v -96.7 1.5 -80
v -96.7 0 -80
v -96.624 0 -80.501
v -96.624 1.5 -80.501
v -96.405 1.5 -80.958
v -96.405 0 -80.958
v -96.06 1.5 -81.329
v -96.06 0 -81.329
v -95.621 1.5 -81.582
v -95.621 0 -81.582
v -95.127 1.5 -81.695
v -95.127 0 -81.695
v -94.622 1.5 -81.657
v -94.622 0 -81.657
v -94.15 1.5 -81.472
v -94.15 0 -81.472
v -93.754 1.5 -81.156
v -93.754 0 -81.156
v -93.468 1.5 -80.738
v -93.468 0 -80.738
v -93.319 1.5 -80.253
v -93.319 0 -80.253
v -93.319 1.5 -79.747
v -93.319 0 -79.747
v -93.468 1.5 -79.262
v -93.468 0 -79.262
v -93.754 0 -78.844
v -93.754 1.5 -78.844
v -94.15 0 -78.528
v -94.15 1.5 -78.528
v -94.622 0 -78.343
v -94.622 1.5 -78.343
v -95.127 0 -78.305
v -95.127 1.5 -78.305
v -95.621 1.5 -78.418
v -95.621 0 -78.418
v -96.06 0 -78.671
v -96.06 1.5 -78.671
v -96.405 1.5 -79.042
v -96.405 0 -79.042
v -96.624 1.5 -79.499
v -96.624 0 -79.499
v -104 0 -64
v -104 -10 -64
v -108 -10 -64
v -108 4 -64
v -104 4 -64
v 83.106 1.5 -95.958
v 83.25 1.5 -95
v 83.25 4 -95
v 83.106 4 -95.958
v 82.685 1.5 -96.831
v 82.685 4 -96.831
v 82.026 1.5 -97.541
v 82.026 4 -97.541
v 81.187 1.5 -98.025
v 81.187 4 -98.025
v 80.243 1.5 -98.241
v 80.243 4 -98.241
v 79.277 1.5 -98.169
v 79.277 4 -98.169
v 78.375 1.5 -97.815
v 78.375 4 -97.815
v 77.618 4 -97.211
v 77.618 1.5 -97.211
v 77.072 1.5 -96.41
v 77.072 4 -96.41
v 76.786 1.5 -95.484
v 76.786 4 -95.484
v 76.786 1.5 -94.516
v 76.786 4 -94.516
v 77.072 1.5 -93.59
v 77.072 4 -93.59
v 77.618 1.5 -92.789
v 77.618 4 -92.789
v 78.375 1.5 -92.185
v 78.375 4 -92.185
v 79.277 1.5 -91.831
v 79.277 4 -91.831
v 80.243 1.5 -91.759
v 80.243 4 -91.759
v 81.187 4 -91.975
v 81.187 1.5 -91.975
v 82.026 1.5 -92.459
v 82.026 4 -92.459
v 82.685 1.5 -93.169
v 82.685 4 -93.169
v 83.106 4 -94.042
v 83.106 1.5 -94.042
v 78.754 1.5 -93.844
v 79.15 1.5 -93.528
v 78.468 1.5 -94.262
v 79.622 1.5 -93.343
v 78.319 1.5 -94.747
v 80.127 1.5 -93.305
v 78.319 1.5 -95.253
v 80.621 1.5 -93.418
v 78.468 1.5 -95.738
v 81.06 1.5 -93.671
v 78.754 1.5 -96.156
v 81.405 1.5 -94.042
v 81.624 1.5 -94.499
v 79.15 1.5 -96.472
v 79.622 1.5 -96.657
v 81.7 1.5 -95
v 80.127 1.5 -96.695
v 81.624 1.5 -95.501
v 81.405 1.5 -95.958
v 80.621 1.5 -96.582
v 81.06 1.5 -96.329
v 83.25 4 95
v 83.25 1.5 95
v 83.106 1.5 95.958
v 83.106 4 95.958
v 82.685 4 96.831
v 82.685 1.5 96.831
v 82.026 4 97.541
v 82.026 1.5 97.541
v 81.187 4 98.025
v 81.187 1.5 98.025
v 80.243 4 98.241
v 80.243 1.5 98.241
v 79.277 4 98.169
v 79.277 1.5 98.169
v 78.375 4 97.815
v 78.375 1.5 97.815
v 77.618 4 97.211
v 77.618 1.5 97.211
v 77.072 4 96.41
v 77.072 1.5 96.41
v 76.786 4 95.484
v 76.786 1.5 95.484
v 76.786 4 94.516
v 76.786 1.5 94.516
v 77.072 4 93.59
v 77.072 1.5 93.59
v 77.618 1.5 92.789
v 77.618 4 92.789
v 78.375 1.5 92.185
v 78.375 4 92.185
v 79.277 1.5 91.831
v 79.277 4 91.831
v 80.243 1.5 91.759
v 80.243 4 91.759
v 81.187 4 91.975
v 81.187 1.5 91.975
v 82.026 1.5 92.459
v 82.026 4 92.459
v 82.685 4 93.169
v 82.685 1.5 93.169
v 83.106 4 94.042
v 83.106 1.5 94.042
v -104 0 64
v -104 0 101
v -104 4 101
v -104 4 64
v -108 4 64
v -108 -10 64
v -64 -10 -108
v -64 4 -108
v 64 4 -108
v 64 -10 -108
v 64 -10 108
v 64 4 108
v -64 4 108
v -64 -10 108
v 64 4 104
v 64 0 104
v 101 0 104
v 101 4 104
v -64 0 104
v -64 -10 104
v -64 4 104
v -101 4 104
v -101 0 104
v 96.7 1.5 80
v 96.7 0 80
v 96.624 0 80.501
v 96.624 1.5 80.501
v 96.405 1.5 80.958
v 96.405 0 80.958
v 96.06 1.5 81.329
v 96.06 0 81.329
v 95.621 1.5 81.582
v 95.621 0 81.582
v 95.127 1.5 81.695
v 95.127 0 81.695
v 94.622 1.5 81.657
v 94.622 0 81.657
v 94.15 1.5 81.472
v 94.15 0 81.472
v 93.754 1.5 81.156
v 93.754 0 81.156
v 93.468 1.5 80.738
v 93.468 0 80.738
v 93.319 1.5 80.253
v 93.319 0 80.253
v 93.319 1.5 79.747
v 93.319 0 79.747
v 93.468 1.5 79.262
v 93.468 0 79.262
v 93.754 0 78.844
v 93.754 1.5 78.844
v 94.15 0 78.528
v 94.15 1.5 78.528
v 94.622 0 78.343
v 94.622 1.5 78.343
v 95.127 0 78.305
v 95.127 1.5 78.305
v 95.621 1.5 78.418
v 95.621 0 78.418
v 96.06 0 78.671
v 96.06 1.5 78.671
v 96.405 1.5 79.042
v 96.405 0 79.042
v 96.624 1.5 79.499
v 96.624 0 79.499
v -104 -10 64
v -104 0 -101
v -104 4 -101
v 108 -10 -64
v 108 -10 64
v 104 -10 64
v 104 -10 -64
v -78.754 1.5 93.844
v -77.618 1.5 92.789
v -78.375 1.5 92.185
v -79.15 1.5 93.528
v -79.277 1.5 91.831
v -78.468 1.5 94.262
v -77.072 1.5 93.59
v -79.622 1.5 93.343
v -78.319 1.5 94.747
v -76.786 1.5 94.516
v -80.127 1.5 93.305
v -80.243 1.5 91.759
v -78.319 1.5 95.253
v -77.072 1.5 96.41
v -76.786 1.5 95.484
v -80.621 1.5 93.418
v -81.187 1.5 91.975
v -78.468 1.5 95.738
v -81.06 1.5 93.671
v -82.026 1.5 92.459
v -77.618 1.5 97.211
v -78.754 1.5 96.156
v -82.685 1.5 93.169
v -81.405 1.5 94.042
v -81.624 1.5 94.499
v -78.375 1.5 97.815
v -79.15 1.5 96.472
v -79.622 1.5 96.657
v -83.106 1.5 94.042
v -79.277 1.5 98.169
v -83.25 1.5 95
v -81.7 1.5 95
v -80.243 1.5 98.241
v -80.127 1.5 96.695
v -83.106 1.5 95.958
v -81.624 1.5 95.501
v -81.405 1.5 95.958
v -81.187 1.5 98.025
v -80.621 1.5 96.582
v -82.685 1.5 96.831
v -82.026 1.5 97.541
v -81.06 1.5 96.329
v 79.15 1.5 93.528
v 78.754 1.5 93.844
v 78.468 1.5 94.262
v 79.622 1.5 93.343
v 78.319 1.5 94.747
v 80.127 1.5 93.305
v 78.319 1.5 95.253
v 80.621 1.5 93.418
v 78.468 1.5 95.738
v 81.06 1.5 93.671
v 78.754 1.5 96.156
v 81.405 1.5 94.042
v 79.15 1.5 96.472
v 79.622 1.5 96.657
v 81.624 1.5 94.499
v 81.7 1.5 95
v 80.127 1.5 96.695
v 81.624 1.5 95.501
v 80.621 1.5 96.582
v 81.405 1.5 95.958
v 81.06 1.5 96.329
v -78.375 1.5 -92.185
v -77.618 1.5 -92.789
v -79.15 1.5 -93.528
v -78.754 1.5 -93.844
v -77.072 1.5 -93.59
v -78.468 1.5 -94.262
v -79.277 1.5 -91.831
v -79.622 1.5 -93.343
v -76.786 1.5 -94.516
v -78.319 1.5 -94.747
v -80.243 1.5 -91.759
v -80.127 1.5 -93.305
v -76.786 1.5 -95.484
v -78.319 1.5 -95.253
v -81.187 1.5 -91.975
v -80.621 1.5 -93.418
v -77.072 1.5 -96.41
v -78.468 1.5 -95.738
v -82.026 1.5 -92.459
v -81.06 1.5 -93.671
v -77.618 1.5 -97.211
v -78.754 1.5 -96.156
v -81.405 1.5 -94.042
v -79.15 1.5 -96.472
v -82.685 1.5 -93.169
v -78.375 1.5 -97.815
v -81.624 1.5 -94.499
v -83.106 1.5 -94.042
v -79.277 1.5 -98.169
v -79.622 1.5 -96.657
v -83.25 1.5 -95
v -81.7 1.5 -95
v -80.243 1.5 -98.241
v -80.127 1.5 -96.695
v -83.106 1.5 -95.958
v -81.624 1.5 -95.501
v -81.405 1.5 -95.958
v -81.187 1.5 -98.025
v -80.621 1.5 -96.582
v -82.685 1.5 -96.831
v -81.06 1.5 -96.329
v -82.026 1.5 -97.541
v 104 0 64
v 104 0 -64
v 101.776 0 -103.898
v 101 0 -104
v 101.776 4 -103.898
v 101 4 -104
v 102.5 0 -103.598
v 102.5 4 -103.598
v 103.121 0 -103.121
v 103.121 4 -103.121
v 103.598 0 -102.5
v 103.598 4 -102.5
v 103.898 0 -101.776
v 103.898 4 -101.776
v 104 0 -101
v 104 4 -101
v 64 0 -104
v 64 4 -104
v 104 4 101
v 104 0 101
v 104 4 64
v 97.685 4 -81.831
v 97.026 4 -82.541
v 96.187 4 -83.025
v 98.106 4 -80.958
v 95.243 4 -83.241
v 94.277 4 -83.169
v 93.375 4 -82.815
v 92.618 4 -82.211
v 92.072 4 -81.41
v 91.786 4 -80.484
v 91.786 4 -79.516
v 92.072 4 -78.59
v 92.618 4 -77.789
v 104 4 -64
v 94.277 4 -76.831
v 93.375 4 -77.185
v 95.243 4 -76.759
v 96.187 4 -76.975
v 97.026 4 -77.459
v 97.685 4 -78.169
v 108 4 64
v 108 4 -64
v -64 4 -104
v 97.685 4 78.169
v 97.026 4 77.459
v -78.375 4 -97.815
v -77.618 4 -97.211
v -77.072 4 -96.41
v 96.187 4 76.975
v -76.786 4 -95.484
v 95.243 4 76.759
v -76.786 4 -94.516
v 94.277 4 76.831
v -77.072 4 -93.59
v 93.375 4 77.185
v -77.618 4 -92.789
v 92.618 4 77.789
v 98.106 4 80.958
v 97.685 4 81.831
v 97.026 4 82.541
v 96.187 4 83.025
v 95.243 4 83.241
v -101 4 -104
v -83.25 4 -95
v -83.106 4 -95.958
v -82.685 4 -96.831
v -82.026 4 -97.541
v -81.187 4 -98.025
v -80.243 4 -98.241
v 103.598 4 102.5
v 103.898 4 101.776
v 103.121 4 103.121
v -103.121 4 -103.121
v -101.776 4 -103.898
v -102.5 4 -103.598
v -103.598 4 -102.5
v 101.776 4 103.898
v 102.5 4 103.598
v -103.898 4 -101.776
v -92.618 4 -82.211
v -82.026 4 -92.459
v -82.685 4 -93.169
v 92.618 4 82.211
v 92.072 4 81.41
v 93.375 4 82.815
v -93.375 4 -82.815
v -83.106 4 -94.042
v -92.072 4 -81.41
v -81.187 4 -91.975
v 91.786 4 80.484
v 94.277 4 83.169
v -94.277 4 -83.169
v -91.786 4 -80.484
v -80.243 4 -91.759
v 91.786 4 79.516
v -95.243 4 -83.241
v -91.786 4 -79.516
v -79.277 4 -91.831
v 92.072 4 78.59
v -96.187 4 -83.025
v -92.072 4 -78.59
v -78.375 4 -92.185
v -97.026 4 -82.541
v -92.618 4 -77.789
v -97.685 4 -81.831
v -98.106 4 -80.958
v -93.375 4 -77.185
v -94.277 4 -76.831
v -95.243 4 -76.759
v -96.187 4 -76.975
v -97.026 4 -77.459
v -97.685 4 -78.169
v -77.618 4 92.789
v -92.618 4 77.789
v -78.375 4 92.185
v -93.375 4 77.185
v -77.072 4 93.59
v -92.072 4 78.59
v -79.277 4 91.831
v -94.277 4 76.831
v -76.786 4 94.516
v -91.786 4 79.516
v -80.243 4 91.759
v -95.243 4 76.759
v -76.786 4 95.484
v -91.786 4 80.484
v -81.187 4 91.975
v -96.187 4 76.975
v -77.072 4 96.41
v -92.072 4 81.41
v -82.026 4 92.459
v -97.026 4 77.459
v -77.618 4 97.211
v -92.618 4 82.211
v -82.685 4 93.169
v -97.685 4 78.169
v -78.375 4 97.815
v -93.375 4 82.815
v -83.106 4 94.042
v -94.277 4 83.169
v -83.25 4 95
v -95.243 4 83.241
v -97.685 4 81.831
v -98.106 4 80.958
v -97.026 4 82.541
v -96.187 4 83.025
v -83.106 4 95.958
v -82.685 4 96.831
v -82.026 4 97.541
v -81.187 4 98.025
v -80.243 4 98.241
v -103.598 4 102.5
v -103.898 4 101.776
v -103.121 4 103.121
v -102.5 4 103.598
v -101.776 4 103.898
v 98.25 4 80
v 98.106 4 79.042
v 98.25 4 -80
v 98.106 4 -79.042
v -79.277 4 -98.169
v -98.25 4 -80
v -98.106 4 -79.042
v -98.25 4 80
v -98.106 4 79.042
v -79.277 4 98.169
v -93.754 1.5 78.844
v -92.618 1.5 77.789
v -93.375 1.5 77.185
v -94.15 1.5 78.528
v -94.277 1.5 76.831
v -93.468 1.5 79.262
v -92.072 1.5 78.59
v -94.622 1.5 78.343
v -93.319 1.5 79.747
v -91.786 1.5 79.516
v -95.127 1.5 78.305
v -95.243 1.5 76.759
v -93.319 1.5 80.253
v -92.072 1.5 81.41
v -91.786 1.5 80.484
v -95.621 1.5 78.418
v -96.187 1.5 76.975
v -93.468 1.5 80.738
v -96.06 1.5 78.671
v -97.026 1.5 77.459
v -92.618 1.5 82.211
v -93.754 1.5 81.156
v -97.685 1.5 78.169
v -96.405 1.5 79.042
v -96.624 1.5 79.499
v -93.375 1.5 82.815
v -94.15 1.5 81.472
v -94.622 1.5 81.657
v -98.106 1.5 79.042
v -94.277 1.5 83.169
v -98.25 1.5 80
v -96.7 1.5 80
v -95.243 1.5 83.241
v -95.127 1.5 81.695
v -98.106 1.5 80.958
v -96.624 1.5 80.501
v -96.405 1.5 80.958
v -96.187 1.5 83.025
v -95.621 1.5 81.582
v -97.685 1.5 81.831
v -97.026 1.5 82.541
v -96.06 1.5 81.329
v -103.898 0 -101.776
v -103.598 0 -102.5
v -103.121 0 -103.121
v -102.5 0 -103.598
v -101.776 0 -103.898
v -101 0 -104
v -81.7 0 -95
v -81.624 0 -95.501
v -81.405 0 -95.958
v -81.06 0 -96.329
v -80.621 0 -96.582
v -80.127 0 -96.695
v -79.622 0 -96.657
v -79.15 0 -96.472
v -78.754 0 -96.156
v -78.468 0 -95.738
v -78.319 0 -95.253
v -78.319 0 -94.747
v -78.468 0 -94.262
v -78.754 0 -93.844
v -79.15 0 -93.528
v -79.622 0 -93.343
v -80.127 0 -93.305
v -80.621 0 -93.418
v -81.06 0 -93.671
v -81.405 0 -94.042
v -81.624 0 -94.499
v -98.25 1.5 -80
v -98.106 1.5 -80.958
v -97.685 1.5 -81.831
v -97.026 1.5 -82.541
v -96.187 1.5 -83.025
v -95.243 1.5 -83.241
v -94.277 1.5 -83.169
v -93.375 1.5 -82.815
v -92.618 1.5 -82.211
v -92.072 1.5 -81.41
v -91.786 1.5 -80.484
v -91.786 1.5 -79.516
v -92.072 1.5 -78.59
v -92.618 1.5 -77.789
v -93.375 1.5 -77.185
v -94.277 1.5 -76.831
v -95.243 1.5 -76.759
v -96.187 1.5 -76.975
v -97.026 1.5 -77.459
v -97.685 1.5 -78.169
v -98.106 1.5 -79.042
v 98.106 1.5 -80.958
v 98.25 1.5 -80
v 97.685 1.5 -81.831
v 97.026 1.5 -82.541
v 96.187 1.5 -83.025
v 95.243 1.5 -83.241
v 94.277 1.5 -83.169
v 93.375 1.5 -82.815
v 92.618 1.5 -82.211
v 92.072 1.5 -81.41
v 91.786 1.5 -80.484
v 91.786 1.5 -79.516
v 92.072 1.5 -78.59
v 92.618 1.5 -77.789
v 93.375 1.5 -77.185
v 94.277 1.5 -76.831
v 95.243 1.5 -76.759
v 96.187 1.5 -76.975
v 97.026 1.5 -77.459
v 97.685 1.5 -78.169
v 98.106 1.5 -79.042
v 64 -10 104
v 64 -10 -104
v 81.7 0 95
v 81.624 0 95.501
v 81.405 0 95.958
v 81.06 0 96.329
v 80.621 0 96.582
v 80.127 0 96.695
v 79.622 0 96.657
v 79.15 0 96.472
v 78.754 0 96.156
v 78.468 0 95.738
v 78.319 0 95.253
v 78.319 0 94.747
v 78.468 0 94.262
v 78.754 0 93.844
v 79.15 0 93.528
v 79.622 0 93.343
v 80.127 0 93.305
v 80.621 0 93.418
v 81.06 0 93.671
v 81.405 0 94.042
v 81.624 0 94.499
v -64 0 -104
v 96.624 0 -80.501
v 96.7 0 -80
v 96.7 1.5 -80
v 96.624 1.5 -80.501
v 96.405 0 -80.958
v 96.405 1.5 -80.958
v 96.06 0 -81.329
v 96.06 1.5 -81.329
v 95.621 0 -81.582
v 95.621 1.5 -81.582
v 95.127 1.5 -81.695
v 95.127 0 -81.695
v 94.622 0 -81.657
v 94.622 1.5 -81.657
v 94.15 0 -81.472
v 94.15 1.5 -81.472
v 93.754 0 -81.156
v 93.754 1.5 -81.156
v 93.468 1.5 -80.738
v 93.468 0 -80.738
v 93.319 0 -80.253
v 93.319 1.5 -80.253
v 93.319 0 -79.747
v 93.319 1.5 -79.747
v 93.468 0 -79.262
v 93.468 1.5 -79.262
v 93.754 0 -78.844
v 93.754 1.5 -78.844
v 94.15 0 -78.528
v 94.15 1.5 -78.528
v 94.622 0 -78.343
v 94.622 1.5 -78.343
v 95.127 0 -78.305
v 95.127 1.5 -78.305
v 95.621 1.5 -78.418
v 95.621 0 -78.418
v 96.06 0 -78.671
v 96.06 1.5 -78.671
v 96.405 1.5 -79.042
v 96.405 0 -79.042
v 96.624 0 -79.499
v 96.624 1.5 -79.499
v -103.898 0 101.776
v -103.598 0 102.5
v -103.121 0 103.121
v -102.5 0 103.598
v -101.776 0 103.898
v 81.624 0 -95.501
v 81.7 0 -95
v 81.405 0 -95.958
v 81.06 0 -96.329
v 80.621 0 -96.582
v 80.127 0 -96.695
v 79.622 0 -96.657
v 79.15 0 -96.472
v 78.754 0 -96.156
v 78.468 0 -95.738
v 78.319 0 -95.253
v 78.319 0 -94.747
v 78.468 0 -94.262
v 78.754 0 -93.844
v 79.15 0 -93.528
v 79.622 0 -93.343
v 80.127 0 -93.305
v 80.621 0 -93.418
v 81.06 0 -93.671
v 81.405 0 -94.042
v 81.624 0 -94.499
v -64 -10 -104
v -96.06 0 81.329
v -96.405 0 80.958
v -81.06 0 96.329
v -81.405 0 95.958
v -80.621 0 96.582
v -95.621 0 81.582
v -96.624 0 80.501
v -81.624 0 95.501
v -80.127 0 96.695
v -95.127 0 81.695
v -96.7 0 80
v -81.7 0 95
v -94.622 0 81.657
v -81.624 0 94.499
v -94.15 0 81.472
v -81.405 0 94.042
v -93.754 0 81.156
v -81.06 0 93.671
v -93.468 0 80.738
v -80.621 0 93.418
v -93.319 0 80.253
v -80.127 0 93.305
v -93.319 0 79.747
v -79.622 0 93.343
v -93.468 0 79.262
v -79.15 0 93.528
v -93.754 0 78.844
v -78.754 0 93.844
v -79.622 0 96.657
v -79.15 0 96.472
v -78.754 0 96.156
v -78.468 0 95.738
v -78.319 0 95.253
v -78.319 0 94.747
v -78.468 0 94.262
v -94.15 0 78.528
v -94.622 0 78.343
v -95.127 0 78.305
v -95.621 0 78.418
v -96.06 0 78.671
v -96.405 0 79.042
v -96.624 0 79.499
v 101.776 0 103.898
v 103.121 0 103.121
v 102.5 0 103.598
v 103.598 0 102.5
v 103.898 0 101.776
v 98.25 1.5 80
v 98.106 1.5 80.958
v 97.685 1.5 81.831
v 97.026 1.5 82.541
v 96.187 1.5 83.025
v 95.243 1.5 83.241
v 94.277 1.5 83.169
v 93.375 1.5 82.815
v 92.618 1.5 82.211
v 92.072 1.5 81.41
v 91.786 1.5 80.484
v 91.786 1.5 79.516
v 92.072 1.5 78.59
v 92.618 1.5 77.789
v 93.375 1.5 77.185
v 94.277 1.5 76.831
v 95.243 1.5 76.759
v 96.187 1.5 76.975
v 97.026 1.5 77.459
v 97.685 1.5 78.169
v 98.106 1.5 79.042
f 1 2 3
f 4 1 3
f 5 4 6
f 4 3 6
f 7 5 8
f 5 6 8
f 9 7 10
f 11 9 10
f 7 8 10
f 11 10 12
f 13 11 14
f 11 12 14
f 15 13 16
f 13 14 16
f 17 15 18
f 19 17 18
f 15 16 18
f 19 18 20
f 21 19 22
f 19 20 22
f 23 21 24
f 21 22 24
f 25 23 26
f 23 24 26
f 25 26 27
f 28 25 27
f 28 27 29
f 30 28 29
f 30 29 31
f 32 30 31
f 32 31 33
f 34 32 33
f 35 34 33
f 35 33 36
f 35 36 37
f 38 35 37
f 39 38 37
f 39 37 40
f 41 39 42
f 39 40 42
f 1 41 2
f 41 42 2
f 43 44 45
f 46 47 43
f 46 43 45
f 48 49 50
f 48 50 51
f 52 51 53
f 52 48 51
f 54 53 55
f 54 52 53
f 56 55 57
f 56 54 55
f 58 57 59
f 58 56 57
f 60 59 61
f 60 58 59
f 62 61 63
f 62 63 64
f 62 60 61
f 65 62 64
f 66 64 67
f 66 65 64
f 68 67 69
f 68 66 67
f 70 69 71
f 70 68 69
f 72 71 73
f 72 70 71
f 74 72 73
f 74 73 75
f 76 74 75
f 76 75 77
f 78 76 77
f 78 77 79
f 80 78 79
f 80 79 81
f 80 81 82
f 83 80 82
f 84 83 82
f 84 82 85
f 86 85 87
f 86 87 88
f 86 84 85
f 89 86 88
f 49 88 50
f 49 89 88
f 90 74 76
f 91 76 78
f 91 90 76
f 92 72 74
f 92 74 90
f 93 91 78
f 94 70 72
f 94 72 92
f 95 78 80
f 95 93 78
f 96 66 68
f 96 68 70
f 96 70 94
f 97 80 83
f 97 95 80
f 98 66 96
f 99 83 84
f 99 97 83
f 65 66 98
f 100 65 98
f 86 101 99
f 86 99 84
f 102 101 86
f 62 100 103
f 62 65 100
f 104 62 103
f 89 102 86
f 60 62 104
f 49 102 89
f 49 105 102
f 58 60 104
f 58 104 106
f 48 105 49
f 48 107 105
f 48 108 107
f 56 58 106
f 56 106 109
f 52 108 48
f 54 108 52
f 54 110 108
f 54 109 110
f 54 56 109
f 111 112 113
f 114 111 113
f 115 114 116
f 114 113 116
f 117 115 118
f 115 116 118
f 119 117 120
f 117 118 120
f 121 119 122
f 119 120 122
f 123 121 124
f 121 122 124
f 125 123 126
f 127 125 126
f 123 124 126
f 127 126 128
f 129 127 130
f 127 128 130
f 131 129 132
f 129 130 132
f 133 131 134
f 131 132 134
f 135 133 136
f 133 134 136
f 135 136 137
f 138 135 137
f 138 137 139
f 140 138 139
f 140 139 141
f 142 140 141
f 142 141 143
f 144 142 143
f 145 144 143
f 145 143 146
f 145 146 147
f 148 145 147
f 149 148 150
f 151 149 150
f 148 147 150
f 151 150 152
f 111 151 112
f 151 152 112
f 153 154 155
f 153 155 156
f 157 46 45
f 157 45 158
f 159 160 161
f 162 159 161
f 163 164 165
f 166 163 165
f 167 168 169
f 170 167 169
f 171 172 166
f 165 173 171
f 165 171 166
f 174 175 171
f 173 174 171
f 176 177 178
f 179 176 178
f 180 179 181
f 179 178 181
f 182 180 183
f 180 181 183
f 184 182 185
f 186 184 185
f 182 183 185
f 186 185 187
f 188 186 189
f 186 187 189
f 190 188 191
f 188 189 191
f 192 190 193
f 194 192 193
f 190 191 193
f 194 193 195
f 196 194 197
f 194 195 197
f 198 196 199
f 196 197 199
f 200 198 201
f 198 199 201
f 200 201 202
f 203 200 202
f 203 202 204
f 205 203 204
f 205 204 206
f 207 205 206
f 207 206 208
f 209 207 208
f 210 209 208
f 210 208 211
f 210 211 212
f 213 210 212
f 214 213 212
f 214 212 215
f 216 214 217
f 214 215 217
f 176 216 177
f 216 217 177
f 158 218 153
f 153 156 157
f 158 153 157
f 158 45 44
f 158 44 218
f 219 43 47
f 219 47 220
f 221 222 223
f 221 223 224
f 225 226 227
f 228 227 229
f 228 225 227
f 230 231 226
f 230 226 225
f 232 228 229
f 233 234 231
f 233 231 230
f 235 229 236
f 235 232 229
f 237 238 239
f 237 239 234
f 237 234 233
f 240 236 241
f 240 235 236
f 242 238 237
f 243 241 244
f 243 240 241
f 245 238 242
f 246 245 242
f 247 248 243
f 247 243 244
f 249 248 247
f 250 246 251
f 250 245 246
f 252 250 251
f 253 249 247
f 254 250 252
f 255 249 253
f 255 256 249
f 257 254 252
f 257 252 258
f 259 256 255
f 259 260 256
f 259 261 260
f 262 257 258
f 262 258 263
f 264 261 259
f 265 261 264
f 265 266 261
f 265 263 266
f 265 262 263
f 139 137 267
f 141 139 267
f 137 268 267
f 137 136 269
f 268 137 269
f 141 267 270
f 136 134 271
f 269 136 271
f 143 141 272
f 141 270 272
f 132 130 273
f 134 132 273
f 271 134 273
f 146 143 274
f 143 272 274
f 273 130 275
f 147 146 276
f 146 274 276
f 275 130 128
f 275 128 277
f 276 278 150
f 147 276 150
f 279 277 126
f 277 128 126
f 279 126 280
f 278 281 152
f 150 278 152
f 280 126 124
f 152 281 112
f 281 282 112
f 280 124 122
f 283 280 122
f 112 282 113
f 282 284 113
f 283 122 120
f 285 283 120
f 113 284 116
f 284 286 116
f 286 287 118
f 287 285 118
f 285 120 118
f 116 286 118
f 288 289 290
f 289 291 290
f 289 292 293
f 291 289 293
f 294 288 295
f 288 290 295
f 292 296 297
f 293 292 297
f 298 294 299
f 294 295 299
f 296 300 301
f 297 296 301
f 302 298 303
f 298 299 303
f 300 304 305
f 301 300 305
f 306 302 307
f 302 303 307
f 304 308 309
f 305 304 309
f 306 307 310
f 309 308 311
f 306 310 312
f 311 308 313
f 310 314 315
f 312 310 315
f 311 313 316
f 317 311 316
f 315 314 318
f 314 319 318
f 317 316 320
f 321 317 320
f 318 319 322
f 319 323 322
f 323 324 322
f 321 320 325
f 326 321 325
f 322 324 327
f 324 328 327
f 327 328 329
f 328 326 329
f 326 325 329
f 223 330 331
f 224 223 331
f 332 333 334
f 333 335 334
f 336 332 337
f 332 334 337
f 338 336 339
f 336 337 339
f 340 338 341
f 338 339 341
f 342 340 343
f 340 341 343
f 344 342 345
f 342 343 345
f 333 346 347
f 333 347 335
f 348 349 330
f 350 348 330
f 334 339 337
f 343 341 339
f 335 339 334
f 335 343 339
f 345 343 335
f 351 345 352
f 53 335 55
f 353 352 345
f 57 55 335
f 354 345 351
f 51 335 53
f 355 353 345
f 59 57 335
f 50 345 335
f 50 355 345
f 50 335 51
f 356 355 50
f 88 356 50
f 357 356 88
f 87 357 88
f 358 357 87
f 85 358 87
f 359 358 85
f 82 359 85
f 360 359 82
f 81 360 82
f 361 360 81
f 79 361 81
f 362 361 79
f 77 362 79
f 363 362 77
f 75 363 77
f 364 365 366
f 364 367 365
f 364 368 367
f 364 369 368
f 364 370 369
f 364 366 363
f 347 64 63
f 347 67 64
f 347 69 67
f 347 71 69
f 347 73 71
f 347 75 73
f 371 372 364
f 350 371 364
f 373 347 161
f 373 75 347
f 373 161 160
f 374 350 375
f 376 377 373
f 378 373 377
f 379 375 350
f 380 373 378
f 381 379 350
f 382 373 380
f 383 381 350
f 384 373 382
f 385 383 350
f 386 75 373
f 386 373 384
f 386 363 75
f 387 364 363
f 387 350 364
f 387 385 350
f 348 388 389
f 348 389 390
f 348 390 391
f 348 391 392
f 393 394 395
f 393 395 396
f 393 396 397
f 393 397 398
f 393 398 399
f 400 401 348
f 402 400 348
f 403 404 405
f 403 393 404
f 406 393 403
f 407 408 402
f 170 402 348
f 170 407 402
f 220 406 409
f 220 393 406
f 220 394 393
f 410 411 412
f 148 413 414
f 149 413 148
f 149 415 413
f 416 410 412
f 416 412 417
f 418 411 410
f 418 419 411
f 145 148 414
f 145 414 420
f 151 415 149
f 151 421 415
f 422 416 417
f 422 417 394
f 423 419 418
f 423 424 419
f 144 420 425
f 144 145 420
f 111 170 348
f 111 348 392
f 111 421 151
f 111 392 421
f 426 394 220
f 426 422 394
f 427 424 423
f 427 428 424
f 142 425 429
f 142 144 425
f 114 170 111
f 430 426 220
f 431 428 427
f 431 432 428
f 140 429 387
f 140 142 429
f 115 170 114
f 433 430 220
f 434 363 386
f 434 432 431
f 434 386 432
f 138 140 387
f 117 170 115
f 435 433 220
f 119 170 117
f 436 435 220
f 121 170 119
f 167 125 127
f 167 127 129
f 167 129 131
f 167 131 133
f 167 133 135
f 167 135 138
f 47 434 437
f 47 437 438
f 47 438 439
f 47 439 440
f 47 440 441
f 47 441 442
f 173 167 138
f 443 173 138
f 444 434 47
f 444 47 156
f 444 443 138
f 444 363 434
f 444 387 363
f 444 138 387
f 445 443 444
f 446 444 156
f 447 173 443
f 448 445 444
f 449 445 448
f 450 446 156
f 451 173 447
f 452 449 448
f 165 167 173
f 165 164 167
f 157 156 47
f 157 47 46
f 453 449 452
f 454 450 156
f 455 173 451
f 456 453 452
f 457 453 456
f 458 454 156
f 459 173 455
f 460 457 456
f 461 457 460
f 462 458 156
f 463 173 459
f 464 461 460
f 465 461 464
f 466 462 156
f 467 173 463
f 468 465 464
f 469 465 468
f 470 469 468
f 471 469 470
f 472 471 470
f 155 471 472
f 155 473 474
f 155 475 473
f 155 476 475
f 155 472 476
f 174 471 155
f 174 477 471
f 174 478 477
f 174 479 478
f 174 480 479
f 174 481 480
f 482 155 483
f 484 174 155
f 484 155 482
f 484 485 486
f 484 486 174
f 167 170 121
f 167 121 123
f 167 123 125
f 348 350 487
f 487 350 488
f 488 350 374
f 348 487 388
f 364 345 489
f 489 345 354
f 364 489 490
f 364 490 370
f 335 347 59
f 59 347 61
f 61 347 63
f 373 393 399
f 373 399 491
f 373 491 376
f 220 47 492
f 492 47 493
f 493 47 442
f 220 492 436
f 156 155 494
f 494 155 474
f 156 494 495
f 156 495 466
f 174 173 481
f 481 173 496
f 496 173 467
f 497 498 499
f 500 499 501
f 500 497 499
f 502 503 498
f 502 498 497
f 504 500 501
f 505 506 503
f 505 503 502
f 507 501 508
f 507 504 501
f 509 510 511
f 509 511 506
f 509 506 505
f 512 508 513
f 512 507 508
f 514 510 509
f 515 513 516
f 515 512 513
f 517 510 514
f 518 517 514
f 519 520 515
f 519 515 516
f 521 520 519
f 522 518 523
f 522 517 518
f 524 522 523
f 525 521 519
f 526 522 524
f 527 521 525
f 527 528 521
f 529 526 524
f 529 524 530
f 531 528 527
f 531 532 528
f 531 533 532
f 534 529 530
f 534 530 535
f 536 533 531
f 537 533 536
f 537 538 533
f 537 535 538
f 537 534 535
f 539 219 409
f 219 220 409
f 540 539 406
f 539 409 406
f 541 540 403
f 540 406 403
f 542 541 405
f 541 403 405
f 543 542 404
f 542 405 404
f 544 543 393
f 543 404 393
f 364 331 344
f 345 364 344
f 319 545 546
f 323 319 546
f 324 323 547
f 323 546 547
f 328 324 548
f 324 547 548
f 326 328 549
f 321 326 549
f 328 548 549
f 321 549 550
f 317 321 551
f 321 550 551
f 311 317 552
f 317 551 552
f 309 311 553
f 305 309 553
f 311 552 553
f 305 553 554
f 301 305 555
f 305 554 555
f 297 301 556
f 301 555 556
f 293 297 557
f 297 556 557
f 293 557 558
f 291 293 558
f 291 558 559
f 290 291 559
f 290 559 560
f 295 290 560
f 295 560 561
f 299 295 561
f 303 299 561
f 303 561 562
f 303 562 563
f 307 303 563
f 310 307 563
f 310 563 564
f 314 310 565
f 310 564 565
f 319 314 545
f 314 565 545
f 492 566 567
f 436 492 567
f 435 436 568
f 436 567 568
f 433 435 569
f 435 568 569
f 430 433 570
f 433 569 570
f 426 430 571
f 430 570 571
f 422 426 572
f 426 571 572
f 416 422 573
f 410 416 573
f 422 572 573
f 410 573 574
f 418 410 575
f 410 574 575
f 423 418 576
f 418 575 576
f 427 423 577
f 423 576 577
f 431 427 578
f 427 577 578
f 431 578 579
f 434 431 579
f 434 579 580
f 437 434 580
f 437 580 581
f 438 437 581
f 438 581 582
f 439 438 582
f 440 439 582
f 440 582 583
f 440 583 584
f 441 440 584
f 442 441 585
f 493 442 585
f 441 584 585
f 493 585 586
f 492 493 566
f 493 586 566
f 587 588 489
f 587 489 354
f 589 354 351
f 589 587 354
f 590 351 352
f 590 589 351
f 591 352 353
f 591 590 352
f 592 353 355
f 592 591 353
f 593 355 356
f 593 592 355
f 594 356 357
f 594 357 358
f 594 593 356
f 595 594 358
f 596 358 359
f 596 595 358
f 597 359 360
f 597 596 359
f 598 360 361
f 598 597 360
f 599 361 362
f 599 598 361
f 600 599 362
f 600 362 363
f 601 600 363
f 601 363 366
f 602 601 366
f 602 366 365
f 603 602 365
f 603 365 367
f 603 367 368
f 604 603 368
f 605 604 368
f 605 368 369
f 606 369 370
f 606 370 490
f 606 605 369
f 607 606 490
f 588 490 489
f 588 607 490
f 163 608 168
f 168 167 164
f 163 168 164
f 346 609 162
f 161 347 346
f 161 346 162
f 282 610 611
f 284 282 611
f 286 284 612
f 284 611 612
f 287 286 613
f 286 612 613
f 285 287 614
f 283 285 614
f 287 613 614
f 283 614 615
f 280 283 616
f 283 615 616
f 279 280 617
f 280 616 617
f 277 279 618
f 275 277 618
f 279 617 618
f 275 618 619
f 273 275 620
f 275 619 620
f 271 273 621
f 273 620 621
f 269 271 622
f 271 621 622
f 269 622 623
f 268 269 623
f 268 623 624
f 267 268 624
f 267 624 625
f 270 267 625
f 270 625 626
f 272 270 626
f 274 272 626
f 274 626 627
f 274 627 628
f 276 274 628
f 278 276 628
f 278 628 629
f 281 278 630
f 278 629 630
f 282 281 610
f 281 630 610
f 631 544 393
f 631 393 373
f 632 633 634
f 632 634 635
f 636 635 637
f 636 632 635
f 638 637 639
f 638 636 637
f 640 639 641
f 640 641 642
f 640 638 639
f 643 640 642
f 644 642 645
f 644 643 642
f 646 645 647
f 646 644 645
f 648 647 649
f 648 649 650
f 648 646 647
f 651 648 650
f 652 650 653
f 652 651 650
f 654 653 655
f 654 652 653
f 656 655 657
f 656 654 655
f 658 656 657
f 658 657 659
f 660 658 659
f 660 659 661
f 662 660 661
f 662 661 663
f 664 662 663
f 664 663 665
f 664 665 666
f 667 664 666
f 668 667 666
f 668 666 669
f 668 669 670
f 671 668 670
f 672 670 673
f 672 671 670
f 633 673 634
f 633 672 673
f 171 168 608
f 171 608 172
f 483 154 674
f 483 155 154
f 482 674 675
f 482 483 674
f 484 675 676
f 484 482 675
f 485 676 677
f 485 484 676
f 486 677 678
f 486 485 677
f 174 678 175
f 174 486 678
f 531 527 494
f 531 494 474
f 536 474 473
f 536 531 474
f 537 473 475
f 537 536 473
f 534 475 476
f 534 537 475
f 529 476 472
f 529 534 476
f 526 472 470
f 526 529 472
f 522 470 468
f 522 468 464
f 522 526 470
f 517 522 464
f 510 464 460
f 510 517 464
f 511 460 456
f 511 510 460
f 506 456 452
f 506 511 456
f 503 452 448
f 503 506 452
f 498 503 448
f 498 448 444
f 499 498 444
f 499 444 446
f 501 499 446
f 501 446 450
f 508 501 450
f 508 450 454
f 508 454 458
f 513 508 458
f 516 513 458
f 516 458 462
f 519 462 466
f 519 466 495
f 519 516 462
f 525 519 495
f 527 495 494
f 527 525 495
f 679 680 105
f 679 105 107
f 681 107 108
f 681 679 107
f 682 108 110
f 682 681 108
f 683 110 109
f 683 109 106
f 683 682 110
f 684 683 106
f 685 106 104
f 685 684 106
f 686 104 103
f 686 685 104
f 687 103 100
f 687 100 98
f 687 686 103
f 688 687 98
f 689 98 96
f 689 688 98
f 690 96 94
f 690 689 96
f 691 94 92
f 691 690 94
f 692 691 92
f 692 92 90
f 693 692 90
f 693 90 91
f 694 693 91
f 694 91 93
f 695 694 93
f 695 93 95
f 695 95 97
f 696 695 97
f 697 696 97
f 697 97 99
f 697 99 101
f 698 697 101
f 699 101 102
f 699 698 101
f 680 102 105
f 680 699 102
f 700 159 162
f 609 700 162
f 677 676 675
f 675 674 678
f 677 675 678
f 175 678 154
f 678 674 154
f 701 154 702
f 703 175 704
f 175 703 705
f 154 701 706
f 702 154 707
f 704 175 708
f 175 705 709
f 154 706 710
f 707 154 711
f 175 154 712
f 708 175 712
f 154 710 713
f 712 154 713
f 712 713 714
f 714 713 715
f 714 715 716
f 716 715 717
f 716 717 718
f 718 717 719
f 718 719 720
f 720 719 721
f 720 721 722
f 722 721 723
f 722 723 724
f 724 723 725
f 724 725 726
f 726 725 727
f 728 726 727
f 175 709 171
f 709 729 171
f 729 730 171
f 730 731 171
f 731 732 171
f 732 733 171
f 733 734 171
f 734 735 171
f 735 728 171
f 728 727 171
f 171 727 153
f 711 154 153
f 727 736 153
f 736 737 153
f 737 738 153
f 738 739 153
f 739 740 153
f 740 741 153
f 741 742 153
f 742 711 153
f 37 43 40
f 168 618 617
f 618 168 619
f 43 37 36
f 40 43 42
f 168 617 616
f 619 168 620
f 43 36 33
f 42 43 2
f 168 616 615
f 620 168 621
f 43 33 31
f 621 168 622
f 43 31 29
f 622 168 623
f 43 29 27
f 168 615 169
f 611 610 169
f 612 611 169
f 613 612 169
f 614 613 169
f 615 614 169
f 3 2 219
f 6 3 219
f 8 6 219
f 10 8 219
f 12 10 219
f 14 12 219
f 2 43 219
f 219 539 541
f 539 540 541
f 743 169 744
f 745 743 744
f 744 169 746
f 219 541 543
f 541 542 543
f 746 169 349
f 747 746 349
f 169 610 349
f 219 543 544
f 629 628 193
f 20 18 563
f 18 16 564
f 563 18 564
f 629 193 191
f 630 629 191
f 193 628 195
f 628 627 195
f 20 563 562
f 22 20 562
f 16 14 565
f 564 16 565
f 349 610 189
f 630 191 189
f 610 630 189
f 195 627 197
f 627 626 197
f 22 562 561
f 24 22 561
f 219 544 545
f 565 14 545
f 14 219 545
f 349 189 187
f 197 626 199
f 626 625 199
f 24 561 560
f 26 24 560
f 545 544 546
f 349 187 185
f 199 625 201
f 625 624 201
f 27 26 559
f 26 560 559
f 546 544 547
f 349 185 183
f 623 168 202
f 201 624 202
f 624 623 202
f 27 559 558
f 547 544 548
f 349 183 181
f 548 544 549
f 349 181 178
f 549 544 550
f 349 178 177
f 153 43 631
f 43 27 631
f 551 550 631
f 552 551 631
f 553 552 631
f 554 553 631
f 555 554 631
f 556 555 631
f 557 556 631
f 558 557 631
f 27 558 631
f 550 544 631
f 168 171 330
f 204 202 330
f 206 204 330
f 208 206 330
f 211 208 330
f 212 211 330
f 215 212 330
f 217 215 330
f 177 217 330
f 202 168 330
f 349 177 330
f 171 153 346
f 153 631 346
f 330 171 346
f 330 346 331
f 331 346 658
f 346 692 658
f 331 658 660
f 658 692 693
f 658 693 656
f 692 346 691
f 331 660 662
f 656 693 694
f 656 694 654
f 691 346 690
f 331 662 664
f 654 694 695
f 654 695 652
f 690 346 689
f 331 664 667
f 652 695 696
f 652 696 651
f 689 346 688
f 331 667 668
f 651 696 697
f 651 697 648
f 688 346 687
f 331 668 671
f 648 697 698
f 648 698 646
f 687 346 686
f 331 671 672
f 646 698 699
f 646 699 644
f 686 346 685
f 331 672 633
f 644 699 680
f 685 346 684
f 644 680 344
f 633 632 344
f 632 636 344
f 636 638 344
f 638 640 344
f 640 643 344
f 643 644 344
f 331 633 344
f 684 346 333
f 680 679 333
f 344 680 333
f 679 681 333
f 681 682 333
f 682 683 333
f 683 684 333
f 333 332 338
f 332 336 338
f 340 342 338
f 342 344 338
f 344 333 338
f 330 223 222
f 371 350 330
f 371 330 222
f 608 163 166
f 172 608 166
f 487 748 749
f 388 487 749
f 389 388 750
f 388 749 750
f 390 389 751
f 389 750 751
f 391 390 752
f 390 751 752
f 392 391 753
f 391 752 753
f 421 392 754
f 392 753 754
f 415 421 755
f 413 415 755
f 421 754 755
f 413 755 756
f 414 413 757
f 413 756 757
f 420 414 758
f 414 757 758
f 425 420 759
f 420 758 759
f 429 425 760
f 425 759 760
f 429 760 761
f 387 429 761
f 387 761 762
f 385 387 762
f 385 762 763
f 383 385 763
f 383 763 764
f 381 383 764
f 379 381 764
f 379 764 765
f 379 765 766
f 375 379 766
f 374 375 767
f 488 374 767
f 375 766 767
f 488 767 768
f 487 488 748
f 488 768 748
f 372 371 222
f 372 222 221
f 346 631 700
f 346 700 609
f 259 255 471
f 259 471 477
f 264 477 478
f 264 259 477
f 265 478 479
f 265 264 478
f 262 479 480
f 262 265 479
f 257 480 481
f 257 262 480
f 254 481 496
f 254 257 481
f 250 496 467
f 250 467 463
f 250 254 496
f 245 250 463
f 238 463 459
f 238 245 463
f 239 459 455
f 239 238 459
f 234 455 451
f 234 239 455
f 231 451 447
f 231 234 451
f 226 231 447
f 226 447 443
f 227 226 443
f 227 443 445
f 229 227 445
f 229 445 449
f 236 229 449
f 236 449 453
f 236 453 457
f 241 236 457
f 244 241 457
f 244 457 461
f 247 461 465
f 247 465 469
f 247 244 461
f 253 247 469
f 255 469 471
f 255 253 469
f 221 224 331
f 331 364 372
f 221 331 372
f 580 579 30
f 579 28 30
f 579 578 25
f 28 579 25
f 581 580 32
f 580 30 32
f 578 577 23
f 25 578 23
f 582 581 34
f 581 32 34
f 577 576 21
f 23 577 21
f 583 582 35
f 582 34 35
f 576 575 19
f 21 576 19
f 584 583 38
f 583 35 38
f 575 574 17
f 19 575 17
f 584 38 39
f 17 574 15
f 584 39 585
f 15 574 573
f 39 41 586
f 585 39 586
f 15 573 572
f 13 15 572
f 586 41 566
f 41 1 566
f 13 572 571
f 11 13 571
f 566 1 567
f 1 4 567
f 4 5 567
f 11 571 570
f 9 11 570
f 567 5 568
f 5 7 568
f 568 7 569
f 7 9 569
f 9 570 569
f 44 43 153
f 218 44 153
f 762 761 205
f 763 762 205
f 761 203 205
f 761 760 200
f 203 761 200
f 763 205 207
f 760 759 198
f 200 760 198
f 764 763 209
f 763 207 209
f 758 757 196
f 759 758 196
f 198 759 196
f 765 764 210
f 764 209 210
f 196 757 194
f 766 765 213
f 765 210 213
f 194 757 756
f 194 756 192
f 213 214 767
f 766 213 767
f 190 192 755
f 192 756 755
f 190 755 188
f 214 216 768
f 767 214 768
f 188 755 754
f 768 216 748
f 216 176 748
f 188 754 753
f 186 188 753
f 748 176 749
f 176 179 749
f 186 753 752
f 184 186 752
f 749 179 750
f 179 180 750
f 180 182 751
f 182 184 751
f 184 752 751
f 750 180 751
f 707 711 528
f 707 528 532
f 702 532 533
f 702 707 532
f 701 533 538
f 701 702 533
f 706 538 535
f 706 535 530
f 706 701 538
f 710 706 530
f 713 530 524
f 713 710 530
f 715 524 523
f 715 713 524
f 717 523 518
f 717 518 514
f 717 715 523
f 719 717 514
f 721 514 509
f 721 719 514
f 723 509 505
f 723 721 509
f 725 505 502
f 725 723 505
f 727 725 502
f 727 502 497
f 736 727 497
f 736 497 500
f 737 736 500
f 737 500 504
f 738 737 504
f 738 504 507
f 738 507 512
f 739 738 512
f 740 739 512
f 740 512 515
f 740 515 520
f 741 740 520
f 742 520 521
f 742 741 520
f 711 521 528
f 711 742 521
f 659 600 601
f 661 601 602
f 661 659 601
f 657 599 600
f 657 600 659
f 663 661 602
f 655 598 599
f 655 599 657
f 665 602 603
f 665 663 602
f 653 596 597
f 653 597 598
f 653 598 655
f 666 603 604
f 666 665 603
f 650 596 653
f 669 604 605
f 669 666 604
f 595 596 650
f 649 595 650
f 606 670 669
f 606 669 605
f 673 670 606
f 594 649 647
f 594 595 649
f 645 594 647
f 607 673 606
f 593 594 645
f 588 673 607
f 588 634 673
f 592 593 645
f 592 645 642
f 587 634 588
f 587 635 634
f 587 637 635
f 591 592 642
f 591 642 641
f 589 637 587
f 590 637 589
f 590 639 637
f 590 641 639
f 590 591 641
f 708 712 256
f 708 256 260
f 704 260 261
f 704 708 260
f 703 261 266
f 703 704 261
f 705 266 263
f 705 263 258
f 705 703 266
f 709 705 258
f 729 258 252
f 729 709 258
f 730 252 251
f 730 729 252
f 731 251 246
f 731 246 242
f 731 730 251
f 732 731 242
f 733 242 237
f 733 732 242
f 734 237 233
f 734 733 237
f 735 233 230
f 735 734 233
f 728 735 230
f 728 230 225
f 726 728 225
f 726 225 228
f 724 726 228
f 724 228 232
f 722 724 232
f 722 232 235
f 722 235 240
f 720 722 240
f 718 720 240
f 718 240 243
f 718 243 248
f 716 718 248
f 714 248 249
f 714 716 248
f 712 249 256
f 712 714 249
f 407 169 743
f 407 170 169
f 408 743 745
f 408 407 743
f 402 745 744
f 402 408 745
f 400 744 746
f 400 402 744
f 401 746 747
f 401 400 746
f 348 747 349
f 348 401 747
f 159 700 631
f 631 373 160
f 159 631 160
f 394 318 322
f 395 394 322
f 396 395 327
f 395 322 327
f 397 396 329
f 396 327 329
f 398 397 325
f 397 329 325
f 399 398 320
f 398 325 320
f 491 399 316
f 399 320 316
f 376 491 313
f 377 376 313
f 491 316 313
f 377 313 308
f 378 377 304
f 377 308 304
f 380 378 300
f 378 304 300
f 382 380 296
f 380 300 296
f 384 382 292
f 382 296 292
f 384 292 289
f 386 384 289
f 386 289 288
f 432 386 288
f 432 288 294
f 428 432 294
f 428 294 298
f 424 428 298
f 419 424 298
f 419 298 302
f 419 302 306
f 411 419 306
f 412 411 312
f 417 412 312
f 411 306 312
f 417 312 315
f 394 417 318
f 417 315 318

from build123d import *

# Parameters (mm, degrees)
SKETCH1_W                              = 208
SKETCH1_H                              = 208
BASE_PLATE_DEPTH                       = 4
MOUNTING_HOLES_START                   = 1.5
MOUNTING_HOLES_OUTLINE_R               = 3.25
MOUNTING_HOLES_DEPTH                   = 2.5
MOUNTING_HOLES_2_OUTLINE_R             = 1.7
MOUNTING_HOLES_2_DEPTH                 = 1.5
MOUNTING_HOLES_MIRROR2_START           = 1.5
MOUNTING_HOLES_MIRROR2_COPY_1_SKETCH_R = 3.25
MOUNTING_HOLES_MIRROR2_COPY_1_DEPTH    = 2.5
MOUNTING_HOLES_MIRROR2_COPY_2_SKETCH_R = 1.7
MOUNTING_HOLES_MIRROR2_COPY_2_DEPTH    = 1.5
MOUNTING_HOLES_MIRROR2_COPY_3_SKETCH_R = 1.7
MOUNTING_HOLES_MIRROR2_COPY_3_DEPTH    = 1.5
SKETCH5_W                              = 128
SKETCH5_H                              = 4
SIDE_EXTRUSION_DEPTH                   = 14
SIDE_EXTRUSION_MIRROR2_COPY_1_SKETCH_W = 128
SIDE_EXTRUSION_MIRROR2_COPY_1_SKETCH_H = 4
SIDE_EXTRUSION_MIRROR2_COPY_1_DEPTH    = 14
EDGE_FILLETS_R                         = 3


# Read off the part's stored shape, not the designer's step: mounting_holes
with BuildPart() as part:
    # Sketch1 → base_plate (new body)
    with BuildSketch(Plane(origin=(0, 0, 0), x_dir=(1, 0, 0), z_dir=(0, 1, 0))):
        Rectangle(SKETCH1_W, SKETCH1_H)
    extrude(amount=BASE_PLATE_DEPTH)

    # mounting_holes outline → mounting_holes (cut)
    with BuildSketch(Plane(origin=(0, 0, 0), x_dir=(1, 0, 0), z_dir=(0, 1, 0)).offset(MOUNTING_HOLES_START)):
        with Locations((95, 80)):
            Circle(MOUNTING_HOLES_OUTLINE_R)
        with Locations((80, 95)):
            Circle(MOUNTING_HOLES_OUTLINE_R)
    mounting_holes = extrude(amount=MOUNTING_HOLES_DEPTH, mode=Mode.SUBTRACT)

    # mounting_holes 2 outline → mounting_holes 2 (cut)
    with BuildSketch(Plane(origin=(0, 0, 0), x_dir=(1, 0, 0), z_dir=(0, 1, 0))):
        with Locations((95, 80)):
            Circle(MOUNTING_HOLES_2_OUTLINE_R)
        with Locations((80, 95)):
            Circle(MOUNTING_HOLES_2_OUTLINE_R)
    mounting_holes_2 = extrude(amount=MOUNTING_HOLES_2_DEPTH, mode=Mode.SUBTRACT)

    # mounting_holes_mirror1: mounting_holes, mounting_holes 2 across plane
    add(mounting_holes.mirror(Plane.XY), mode=Mode.SUBTRACT)
    add(mounting_holes_2.mirror(Plane.XY), mode=Mode.SUBTRACT)

    # mounting_holes_mirror2: mounting_holes, mounting_holes 2 across plane
    add(mounting_holes.mirror(Plane(origin=(0, 0, 0), x_dir=(0, 0, 1), z_dir=(1, 0, 0))), mode=Mode.SUBTRACT)
    add(mounting_holes_2.mirror(Plane(origin=(0, 0, 0), x_dir=(0, 0, 1), z_dir=(1, 0, 0))), mode=Mode.SUBTRACT)

    # mounting_holes_mirror2 copy 1 sketch → mounting_holes_mirror2 copy 1 (cut)
    with BuildSketch(Plane(origin=(0, 0, 0), x_dir=(-1, 0, 0), z_dir=(0, 1, 0)).offset(MOUNTING_HOLES_MIRROR2_START)):
        with Locations((95, 80)):
            Circle(MOUNTING_HOLES_MIRROR2_COPY_1_SKETCH_R)
        with Locations((80, 95)):
            Circle(MOUNTING_HOLES_MIRROR2_COPY_1_SKETCH_R)
    extrude(amount=MOUNTING_HOLES_MIRROR2_COPY_1_DEPTH, mode=Mode.SUBTRACT)

    # mounting_holes_mirror2 copy 2 sketch → mounting_holes_mirror2 copy 2 (cut)
    with BuildSketch(Plane(origin=(0, 0, 0), x_dir=(-1, 0, 0), z_dir=(0, 1, 0))):
        with Locations((95, 80)):
            Circle(MOUNTING_HOLES_MIRROR2_COPY_2_SKETCH_R)
        with Locations((80, 95)):
            Circle(MOUNTING_HOLES_MIRROR2_COPY_2_SKETCH_R)
    extrude(amount=MOUNTING_HOLES_MIRROR2_COPY_2_DEPTH, mode=Mode.SUBTRACT)

    # mounting_holes_mirror2 copy 3 sketch → mounting_holes_mirror2 copy 3 (cut)
    with BuildSketch(Plane(origin=(0, 0, 0), x_dir=(-1, 0, 0), z_dir=(0, 1, 0))):
        with Locations((95, -80)):
            Circle(MOUNTING_HOLES_MIRROR2_COPY_3_SKETCH_R)
        with Locations((80, -95)):
            Circle(MOUNTING_HOLES_MIRROR2_COPY_3_SKETCH_R)
    extrude(amount=MOUNTING_HOLES_MIRROR2_COPY_3_DEPTH, mode=Mode.SUBTRACT)

    # Sketch5 → side_extrusion (add)
    with BuildSketch(Plane(origin=(0, 4, 0), x_dir=(1, 0, 0), z_dir=(0, 1, 0))):
        with Locations((0, 106)):
            Rectangle(SKETCH5_W, SKETCH5_H)
    side_extrusion = extrude(amount=-SIDE_EXTRUSION_DEPTH)

    # side_extrusion_mirror1: side_extrusion across plane
    add(side_extrusion.mirror(Plane(origin=(0, 0, 0), x_dir=(0.7071067811865476, 0, 0.7071067811865476), z_dir=(0.7071067811865477, 0, -0.7071067811865475))))

    # side_extrusion_mirror2: side_extrusion across plane
    add(side_extrusion.mirror(Plane(origin=(0, 0, 0), x_dir=(-0.7071067811865476, 0, 0.7071067811865476), z_dir=(0.7071067811865477, 0, 0.7071067811865475))))

    # side_extrusion_mirror2 copy 1 sketch → side_extrusion_mirror2 copy 1 (add)
    with BuildSketch(Plane(origin=(0, 4, 0), x_dir=(-1, 0, 0), z_dir=(0, 1, 0))):
        with Locations((0, 106)):
            Rectangle(SIDE_EXTRUSION_MIRROR2_COPY_1_SKETCH_W, SIDE_EXTRUSION_MIRROR2_COPY_1_SKETCH_H)
    extrude(amount=-SIDE_EXTRUSION_MIRROR2_COPY_1_DEPTH)

    # edge_fillets
    edge_fillets_edges = [part.edges().sort_by_distance(p)[0] for p in [
        (104, 2, 104),
        (-104, 2, 104),
        (-104, 2, -104),
        (104, 2, -104),
    ]]
    fillet(edge_fillets_edges, radius=EDGE_FILLETS_R)


solid = part.part
